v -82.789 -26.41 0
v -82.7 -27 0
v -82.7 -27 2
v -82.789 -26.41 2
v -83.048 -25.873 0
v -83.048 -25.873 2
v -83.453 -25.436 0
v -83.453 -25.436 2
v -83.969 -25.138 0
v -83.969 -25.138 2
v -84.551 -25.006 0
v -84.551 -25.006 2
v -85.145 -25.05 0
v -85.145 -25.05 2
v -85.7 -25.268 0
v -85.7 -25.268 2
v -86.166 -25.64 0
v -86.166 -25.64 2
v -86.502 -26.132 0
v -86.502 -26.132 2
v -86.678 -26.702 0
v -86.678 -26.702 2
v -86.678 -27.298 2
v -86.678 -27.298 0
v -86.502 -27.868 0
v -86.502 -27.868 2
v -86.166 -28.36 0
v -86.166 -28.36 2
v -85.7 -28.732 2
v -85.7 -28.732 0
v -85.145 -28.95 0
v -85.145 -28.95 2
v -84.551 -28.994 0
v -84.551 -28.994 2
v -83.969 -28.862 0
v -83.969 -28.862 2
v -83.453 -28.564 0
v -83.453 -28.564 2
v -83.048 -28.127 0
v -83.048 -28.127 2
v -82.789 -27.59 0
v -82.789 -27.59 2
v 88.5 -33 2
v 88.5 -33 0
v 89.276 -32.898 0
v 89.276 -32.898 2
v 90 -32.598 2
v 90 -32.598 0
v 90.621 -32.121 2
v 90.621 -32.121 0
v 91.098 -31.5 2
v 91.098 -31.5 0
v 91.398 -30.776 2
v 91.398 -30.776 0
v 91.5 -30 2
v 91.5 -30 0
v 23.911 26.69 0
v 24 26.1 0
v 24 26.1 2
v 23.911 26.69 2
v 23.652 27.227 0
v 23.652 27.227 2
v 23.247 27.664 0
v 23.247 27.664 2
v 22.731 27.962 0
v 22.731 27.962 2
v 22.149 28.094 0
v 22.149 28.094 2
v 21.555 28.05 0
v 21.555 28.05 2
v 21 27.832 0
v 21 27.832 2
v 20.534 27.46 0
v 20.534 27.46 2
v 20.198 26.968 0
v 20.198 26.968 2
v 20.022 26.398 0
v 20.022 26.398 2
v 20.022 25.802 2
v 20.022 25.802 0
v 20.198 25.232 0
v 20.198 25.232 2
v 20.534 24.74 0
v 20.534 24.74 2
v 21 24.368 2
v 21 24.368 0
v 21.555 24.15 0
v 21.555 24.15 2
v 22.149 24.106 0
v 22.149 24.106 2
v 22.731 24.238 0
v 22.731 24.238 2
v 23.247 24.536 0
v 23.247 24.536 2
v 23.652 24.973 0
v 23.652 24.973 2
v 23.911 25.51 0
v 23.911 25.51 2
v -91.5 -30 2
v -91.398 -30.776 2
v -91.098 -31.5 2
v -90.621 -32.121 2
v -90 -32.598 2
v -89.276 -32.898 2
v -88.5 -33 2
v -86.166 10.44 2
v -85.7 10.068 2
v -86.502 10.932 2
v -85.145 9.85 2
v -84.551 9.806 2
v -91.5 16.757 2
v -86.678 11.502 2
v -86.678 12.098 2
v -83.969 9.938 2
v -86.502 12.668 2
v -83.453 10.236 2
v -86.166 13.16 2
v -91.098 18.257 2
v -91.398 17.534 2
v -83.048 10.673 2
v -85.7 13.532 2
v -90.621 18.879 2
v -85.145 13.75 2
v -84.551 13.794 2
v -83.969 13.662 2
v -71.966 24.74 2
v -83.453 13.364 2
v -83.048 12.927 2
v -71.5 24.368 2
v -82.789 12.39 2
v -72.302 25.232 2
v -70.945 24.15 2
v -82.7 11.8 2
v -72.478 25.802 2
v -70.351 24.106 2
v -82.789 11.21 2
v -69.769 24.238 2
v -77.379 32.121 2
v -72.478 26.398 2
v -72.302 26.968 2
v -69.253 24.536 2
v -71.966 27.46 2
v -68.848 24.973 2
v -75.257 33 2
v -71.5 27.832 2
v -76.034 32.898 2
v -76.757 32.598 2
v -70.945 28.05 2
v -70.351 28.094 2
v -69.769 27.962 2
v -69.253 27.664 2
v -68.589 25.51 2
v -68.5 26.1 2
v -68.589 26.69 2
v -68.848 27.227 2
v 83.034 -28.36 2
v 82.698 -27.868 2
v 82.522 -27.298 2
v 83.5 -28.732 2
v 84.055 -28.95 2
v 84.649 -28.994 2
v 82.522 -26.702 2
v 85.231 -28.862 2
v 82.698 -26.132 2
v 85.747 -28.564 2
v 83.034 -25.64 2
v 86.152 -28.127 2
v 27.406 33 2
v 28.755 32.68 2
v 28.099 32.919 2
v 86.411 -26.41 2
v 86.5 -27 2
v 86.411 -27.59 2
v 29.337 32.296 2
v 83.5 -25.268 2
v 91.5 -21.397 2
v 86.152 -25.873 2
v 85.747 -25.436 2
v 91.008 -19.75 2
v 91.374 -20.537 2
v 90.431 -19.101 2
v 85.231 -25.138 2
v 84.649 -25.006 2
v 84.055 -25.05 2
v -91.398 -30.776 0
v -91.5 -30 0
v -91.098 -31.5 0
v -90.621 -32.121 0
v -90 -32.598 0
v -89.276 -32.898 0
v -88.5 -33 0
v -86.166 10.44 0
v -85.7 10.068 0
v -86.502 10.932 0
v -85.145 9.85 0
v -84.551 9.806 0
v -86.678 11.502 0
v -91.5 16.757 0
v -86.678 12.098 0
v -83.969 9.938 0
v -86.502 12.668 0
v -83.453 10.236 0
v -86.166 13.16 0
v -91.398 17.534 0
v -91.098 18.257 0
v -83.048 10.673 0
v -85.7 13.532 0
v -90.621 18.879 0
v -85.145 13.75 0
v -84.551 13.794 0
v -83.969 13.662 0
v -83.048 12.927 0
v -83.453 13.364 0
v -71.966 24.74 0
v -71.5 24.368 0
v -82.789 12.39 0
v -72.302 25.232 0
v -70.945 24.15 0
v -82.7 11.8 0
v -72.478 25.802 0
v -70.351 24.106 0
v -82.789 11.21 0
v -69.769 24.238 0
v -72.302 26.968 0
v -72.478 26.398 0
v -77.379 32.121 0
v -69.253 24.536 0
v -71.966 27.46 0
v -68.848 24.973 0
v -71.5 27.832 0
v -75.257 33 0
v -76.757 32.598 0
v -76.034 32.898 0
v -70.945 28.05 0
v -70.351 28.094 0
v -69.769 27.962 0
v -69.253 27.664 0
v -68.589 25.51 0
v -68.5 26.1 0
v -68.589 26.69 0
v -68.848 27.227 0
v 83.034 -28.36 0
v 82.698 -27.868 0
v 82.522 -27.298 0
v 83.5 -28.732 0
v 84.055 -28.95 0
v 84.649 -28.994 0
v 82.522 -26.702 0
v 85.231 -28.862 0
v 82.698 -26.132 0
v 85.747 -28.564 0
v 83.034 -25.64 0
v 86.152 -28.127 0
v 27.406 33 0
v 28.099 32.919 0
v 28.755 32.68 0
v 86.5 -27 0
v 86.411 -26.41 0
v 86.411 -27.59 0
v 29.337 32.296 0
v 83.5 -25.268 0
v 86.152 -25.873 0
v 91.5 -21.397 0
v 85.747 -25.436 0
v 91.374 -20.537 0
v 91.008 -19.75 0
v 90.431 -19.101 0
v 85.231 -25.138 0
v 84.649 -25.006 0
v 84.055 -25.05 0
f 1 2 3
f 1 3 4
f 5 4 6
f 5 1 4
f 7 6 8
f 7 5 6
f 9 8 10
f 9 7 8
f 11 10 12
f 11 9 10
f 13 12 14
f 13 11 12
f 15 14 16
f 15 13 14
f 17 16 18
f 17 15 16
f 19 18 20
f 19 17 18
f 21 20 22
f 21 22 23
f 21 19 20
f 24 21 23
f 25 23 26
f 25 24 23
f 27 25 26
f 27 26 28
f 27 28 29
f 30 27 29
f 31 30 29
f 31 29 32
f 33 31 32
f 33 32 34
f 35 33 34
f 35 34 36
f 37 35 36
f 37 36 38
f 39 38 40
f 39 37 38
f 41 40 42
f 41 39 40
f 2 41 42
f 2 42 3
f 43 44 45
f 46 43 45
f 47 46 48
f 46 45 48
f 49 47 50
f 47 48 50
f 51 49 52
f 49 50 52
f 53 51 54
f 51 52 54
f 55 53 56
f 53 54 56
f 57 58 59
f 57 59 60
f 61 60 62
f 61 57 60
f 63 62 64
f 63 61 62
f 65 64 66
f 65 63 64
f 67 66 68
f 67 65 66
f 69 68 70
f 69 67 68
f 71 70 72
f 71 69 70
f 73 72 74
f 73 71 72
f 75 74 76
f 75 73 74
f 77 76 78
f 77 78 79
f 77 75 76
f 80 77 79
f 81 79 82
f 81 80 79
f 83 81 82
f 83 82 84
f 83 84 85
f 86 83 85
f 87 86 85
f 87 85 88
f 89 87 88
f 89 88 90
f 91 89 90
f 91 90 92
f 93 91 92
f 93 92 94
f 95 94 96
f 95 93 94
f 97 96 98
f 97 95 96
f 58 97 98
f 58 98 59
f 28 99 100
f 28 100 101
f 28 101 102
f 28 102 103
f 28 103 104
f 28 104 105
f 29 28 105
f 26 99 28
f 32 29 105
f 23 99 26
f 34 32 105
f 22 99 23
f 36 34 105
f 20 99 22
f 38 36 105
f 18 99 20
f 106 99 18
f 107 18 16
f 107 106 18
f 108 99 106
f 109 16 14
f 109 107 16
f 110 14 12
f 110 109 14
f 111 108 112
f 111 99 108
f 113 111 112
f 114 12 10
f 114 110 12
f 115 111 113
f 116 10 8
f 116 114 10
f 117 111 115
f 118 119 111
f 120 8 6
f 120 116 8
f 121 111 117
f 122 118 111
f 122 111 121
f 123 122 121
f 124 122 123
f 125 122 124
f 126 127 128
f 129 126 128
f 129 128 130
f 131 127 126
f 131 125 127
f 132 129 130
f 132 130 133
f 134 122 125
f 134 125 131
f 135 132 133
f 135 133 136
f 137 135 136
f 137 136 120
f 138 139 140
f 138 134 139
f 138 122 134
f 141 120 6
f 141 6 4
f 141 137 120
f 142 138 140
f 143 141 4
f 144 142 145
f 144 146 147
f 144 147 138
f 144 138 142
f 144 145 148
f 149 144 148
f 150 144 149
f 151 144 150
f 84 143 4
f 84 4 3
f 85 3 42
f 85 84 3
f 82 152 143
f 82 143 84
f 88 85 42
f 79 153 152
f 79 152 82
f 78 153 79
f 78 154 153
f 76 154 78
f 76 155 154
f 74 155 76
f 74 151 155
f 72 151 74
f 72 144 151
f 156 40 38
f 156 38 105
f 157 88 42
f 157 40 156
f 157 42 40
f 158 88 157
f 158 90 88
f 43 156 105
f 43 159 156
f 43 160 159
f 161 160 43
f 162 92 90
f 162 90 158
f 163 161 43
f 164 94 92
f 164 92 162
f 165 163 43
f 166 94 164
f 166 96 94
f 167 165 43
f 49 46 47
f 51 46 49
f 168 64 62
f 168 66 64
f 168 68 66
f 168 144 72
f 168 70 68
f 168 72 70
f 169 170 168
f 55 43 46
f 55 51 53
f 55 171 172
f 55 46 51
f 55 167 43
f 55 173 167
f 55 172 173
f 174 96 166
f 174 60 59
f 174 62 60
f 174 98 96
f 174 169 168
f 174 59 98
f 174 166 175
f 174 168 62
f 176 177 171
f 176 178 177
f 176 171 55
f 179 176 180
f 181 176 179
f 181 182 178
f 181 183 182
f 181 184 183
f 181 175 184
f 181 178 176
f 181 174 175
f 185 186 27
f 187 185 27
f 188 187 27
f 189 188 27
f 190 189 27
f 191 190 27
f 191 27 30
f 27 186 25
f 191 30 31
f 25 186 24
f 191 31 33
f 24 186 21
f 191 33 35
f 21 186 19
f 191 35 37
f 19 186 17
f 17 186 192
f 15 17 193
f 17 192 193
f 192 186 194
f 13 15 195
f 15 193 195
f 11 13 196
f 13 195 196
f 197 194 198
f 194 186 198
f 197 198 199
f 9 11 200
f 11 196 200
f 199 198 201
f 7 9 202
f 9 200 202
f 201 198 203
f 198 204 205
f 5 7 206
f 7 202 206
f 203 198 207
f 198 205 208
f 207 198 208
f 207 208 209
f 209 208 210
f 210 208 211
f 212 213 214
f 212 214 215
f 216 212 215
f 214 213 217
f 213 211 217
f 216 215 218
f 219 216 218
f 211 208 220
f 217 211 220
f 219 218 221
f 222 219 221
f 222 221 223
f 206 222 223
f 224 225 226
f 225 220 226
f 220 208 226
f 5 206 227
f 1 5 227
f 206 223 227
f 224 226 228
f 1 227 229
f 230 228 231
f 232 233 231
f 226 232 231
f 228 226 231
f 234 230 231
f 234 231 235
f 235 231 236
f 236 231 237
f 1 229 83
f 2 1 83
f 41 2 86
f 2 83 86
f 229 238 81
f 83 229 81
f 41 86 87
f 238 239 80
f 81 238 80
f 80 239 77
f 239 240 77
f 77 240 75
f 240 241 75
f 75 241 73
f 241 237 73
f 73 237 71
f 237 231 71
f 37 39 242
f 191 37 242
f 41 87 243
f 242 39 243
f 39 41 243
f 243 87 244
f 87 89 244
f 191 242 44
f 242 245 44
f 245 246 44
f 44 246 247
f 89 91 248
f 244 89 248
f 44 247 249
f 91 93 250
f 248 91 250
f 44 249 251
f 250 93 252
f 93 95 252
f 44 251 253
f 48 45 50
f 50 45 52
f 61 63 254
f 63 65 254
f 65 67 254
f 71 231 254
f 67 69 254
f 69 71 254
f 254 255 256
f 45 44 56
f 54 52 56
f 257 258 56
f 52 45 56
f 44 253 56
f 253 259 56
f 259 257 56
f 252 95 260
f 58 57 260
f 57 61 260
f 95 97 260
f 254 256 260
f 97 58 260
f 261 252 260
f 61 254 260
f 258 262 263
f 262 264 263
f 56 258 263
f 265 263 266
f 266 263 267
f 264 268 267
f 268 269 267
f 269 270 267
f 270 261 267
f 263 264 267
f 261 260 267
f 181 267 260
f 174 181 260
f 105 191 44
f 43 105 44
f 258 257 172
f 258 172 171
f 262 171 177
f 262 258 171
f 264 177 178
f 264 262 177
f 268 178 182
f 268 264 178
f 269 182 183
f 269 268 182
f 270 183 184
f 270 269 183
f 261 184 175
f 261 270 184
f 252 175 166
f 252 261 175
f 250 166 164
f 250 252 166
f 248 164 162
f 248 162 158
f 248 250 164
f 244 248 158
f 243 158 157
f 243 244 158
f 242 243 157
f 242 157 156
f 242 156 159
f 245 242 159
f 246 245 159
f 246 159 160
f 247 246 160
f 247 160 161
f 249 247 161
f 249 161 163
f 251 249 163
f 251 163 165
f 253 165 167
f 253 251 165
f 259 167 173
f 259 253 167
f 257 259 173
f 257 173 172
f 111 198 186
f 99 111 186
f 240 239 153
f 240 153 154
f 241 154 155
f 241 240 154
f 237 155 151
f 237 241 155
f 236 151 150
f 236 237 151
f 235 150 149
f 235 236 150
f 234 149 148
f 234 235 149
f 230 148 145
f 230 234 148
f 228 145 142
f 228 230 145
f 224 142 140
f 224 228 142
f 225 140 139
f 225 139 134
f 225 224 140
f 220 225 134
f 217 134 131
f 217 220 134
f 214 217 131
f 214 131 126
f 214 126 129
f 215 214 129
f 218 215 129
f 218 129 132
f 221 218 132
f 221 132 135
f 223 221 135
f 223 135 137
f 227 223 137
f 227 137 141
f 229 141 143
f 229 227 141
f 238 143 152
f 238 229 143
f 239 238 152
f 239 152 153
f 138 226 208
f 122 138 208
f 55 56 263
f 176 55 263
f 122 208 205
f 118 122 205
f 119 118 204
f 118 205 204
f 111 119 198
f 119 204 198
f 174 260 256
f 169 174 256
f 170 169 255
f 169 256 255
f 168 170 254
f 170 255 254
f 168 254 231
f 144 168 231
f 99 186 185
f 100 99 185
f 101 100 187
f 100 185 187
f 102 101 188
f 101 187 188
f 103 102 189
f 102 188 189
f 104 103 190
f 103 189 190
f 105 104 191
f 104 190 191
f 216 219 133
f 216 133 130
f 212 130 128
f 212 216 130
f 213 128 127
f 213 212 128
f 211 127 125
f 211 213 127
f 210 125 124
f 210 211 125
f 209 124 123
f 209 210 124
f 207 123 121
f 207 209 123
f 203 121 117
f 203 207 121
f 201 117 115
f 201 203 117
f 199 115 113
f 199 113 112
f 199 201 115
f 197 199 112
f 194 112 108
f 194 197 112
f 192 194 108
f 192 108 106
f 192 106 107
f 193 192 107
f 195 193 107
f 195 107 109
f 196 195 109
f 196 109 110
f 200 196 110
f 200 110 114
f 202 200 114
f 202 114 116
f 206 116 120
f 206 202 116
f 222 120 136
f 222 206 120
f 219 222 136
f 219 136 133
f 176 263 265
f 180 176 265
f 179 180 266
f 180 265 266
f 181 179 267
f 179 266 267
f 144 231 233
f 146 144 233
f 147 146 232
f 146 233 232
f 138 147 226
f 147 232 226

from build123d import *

# Parameters (mm, degrees)
F0_R     = 2
F1_DEPTH = 2


# Not quite as in the source:
# - ends of sketch curves that miss each other by under 0.0002 mm in the source are joined


with BuildPart() as f1:
    # F0 (on Top) → F1 (new body)
    with BuildSketch(Plane.XY):
        with BuildLine():
            ThreePointArc((91.5, -21.3966), (91.2197291677, -20.1304747082), (90.4312844969, -19.1009214093))
            Line((90.4312844969, -19.1009214093), (29.337212, 32.295678))
            ThreePointArc((29.337212, 32.295678), (28.4337805172, 32.818424586), (27.405927, 33))
            Line((27.405927, 33), (-75.25736, 33))
            ThreePointArc((-75.25736, 33), (-76.4054102971, 32.7716385975), (-77.3786803436, 32.1213203436))
            Line((-77.3786803436, 32.1213203436), (-90.621321, 18.87868))
            ThreePointArc((-90.621321, 18.87868), (-91.2716385975, 17.9054092971), (-91.5, 16.757359))
            Line((-91.5, 16.757359), (-91.5, -30))
            ThreePointArc((-91.5, -30), (-90.6213203436, -32.1213203436), (-88.5, -33))
            Line((-88.5, -33), (88.5, -33))
            ThreePointArc((88.5, -33), (90.6213203436, -32.1213203436), (91.5, -30))
            Line((91.5, -30), (91.5, -21.3966))
        make_face()
        with Locations((-84.7, -27)):
            Circle(F0_R, mode=Mode.SUBTRACT)
        with Locations((84.5, -27)):
            Circle(F0_R, mode=Mode.SUBTRACT)
        with Locations((-84.7, 11.8)):
            Circle(F0_R, mode=Mode.SUBTRACT)
        with Locations((-70.5, 26.1)):
            Circle(F0_R, mode=Mode.SUBTRACT)
        with Locations((22, 26.1)):
            Circle(F0_R, mode=Mode.SUBTRACT)
    extrude(amount=F1_DEPTH)


solid = f1.part
